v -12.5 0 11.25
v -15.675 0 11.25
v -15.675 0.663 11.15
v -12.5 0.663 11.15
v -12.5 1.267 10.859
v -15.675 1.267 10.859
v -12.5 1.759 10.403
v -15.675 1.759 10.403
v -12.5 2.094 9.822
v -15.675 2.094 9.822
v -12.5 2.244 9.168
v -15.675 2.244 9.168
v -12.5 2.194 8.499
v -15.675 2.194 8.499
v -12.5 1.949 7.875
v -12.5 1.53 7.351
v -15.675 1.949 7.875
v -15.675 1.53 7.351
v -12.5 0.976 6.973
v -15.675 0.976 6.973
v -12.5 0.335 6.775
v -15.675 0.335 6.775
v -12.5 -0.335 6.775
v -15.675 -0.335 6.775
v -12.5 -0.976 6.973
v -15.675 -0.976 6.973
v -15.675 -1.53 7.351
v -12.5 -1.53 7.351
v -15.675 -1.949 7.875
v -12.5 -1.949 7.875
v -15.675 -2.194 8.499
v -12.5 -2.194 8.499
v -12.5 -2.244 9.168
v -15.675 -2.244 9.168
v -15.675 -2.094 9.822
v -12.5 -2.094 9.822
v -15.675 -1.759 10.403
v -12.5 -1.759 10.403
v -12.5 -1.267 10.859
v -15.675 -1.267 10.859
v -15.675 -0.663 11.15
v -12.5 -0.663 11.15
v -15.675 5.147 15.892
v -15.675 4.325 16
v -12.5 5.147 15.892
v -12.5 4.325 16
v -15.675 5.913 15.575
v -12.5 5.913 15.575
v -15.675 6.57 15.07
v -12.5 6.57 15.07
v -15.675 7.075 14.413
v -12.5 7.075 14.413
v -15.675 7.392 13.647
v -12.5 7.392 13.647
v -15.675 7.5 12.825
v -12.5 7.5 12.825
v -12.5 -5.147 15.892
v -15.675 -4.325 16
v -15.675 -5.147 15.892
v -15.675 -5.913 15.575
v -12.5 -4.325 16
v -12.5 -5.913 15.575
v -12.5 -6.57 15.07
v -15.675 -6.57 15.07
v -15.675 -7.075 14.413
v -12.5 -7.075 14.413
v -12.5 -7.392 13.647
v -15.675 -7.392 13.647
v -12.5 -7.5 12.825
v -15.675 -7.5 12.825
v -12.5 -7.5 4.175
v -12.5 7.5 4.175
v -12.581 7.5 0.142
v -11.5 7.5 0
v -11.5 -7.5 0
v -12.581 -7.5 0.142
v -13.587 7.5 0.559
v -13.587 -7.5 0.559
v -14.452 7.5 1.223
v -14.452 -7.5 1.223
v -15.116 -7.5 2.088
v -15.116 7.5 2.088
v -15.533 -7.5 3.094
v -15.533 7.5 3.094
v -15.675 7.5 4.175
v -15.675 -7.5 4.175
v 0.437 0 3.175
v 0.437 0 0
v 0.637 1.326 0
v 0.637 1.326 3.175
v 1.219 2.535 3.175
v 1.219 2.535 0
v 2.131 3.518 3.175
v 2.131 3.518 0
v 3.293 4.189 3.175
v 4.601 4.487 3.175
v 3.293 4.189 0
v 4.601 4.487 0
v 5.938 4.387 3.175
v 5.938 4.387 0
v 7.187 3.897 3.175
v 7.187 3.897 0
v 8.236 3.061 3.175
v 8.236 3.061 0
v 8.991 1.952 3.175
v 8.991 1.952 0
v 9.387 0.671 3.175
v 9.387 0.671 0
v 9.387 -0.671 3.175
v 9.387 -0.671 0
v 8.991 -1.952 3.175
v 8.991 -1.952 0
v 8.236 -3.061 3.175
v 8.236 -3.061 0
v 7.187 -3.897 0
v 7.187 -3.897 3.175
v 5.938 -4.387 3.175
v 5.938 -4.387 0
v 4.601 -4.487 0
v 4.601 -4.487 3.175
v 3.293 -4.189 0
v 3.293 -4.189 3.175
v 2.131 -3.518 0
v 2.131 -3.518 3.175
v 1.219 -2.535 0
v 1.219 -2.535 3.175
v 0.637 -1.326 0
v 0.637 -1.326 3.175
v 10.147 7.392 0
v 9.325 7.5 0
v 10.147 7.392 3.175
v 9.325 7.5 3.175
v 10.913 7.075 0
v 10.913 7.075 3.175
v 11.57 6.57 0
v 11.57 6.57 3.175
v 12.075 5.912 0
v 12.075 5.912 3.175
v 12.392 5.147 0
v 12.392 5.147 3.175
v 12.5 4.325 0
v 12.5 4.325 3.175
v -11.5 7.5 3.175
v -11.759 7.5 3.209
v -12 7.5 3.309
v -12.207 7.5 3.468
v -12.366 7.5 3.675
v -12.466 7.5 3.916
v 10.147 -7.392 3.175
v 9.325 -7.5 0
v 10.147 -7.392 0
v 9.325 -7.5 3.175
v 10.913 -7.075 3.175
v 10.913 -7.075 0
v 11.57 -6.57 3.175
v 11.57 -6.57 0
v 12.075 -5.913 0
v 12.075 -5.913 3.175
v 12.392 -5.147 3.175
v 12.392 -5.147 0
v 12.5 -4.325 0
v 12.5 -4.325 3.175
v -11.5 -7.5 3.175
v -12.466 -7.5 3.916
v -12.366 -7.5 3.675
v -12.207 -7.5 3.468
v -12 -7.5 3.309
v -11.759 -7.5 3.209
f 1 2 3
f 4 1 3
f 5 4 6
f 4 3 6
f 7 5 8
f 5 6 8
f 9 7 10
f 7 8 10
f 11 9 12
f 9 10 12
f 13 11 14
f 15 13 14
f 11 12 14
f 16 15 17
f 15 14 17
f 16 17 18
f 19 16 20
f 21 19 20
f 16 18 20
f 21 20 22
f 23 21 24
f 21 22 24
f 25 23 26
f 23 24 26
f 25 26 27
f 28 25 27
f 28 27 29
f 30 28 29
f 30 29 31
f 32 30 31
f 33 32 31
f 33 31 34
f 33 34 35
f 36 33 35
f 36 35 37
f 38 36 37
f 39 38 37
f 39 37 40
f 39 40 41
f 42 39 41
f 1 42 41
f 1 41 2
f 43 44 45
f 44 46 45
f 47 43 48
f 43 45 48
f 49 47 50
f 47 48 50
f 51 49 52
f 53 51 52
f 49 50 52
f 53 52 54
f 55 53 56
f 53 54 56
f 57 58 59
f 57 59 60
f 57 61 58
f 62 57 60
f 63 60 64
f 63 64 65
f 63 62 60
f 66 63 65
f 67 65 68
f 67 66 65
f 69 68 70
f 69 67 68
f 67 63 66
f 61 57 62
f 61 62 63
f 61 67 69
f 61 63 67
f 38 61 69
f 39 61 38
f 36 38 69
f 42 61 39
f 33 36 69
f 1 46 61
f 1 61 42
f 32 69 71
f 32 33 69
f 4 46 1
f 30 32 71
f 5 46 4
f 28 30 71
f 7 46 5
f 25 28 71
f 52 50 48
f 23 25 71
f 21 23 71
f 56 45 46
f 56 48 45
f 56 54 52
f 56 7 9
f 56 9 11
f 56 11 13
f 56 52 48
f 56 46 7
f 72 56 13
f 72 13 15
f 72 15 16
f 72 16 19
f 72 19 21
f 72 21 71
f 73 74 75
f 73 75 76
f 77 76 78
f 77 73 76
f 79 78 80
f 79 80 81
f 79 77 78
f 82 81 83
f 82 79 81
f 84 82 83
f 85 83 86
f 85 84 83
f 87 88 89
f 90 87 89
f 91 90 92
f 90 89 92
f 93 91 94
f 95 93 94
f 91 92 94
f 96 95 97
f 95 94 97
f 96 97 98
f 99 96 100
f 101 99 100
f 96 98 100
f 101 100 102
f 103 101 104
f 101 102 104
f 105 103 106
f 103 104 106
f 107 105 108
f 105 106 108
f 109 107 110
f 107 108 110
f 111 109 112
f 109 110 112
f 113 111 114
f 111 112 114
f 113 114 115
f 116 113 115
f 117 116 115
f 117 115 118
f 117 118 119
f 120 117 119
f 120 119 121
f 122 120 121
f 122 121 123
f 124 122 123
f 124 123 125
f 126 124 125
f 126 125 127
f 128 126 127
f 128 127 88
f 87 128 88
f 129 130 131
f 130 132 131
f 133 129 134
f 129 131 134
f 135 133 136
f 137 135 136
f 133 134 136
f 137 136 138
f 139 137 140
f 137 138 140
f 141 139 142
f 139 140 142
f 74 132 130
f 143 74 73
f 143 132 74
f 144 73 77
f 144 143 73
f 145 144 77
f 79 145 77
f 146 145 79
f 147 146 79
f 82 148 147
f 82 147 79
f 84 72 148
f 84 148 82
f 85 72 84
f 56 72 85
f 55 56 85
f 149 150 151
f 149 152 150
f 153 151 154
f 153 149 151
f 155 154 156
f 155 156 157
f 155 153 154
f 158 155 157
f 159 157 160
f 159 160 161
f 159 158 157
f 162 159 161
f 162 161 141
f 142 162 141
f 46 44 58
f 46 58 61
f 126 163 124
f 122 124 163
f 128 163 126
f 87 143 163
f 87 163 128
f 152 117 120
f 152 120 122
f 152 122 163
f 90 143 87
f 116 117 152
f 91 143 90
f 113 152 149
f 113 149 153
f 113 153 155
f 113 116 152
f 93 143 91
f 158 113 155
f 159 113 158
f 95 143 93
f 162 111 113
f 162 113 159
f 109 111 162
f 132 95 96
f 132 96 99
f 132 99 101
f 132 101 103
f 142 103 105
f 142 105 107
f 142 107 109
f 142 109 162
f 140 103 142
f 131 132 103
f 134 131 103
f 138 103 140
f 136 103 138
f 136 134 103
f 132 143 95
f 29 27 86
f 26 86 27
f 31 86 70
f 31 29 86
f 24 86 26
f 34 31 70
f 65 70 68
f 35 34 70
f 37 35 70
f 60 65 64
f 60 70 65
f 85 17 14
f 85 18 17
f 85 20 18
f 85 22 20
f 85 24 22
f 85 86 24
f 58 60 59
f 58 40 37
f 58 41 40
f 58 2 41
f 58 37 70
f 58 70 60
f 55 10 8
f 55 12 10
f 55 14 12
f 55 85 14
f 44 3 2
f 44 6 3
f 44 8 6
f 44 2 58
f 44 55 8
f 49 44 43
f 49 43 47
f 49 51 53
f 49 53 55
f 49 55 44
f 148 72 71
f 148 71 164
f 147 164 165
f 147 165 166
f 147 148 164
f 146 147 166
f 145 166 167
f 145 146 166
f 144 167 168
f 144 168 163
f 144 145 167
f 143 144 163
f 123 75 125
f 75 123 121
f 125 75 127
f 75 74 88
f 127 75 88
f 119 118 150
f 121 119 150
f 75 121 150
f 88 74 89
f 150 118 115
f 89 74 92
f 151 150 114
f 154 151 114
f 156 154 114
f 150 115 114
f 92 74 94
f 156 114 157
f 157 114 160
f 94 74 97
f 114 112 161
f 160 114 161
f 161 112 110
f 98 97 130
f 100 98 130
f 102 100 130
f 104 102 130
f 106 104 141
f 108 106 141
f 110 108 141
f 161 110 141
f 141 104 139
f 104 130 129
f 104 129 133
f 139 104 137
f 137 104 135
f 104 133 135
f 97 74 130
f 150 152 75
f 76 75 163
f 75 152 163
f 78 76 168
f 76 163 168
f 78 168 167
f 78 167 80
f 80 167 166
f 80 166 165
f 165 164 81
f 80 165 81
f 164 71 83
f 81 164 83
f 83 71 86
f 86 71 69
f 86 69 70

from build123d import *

# Parameters (mm, degrees)
SKETCH1_W                    = 25
SKETCH1_H                    = 15
BASE_FLANGE1_DEPTH           = 3.175
EDGE_FLANGE1_STRIP_W         = 14.7
EDGE_FLANGE1_STRIP_H         = 3.175
EDGE_FLANGE1_STRIP_CUT_DEPTH = 15
EDGE_FLANGE1_DEPTH           = 15
M8_CLEARANCE_HOLE2_D         = 9
FILLET1_R                    = 3.175
M4_CLEARANCE_HOLE2_D         = 4.5


# Sheet-metal steps are written as plain solids
with BuildPart() as part:
    # Sketch1 → Base-Flange1 (new body)
    with BuildSketch(Plane.XY):
        Rectangle(SKETCH1_W, SKETCH1_H)
    extrude(amount=BASE_FLANGE1_DEPTH)

    # Edge-Flange1 strip (across the edge) → Edge-Flange1 strip cut (cut)
    with BuildSketch(Plane(origin=(-12.5, 7.5, 3.175), x_dir=(1, 0, 0), z_dir=(0, -1, 0))):
        with Locations((-6.35, -1.5875)):
            Rectangle(EDGE_FLANGE1_STRIP_W, EDGE_FLANGE1_STRIP_H)
    extrude(amount=EDGE_FLANGE1_STRIP_CUT_DEPTH, mode=Mode.SUBTRACT)

    # Edge-Flange1 section (across the edge) → Edge-Flange1 (add)
    with BuildSketch(Plane(origin=(-12.5, 7.5, 3.175), x_dir=(1, 0, 0), z_dir=(0, -1, 0))):
        with BuildLine():
            Line((-3.175, 1), (-3.175, 12.825))
            Line((-3.175, 12.825), (0, 12.825))
            Line((0, 12.825), (0, 1))
            ThreePointArc((0, 1), (0.292893219, 0.292893219), (1, 0))
            Line((1, 0), (1, -3.175))
            ThreePointArc((1, -3.175), (-1.952170811, -1.952170811), (-3.175, 1))
        make_face()
    extrude(amount=EDGE_FLANGE1_DEPTH)

    # M8 Clearance Hole2 (through all)
    with Locations(Plane.XY.offset(3.175)):
        with Locations((4.9369, 0)):
            Hole(M8_CLEARANCE_HOLE2_D / 2)

    # Fillet1
    fillet1_edges = [part.edges().sort_by_distance(p)[0] for p in [
        (-14.0875, 7.5, 16),
        (-14.0875, -7.5, 16),
        (12.5, -7.5, 1.5875),
        (12.5, 7.5, 1.5875),
    ]]
    fillet(fillet1_edges, radius=FILLET1_R)

    # M4 Clearance Hole2 (through all)
    with Locations(Plane(origin=(-12.5, 0, 0), x_dir=(0, 0, -1), z_dir=(1, 0, 0))):
        with Locations((-9, 0)):
            Hole(M4_CLEARANCE_HOLE2_D / 2)


solid = part.part
